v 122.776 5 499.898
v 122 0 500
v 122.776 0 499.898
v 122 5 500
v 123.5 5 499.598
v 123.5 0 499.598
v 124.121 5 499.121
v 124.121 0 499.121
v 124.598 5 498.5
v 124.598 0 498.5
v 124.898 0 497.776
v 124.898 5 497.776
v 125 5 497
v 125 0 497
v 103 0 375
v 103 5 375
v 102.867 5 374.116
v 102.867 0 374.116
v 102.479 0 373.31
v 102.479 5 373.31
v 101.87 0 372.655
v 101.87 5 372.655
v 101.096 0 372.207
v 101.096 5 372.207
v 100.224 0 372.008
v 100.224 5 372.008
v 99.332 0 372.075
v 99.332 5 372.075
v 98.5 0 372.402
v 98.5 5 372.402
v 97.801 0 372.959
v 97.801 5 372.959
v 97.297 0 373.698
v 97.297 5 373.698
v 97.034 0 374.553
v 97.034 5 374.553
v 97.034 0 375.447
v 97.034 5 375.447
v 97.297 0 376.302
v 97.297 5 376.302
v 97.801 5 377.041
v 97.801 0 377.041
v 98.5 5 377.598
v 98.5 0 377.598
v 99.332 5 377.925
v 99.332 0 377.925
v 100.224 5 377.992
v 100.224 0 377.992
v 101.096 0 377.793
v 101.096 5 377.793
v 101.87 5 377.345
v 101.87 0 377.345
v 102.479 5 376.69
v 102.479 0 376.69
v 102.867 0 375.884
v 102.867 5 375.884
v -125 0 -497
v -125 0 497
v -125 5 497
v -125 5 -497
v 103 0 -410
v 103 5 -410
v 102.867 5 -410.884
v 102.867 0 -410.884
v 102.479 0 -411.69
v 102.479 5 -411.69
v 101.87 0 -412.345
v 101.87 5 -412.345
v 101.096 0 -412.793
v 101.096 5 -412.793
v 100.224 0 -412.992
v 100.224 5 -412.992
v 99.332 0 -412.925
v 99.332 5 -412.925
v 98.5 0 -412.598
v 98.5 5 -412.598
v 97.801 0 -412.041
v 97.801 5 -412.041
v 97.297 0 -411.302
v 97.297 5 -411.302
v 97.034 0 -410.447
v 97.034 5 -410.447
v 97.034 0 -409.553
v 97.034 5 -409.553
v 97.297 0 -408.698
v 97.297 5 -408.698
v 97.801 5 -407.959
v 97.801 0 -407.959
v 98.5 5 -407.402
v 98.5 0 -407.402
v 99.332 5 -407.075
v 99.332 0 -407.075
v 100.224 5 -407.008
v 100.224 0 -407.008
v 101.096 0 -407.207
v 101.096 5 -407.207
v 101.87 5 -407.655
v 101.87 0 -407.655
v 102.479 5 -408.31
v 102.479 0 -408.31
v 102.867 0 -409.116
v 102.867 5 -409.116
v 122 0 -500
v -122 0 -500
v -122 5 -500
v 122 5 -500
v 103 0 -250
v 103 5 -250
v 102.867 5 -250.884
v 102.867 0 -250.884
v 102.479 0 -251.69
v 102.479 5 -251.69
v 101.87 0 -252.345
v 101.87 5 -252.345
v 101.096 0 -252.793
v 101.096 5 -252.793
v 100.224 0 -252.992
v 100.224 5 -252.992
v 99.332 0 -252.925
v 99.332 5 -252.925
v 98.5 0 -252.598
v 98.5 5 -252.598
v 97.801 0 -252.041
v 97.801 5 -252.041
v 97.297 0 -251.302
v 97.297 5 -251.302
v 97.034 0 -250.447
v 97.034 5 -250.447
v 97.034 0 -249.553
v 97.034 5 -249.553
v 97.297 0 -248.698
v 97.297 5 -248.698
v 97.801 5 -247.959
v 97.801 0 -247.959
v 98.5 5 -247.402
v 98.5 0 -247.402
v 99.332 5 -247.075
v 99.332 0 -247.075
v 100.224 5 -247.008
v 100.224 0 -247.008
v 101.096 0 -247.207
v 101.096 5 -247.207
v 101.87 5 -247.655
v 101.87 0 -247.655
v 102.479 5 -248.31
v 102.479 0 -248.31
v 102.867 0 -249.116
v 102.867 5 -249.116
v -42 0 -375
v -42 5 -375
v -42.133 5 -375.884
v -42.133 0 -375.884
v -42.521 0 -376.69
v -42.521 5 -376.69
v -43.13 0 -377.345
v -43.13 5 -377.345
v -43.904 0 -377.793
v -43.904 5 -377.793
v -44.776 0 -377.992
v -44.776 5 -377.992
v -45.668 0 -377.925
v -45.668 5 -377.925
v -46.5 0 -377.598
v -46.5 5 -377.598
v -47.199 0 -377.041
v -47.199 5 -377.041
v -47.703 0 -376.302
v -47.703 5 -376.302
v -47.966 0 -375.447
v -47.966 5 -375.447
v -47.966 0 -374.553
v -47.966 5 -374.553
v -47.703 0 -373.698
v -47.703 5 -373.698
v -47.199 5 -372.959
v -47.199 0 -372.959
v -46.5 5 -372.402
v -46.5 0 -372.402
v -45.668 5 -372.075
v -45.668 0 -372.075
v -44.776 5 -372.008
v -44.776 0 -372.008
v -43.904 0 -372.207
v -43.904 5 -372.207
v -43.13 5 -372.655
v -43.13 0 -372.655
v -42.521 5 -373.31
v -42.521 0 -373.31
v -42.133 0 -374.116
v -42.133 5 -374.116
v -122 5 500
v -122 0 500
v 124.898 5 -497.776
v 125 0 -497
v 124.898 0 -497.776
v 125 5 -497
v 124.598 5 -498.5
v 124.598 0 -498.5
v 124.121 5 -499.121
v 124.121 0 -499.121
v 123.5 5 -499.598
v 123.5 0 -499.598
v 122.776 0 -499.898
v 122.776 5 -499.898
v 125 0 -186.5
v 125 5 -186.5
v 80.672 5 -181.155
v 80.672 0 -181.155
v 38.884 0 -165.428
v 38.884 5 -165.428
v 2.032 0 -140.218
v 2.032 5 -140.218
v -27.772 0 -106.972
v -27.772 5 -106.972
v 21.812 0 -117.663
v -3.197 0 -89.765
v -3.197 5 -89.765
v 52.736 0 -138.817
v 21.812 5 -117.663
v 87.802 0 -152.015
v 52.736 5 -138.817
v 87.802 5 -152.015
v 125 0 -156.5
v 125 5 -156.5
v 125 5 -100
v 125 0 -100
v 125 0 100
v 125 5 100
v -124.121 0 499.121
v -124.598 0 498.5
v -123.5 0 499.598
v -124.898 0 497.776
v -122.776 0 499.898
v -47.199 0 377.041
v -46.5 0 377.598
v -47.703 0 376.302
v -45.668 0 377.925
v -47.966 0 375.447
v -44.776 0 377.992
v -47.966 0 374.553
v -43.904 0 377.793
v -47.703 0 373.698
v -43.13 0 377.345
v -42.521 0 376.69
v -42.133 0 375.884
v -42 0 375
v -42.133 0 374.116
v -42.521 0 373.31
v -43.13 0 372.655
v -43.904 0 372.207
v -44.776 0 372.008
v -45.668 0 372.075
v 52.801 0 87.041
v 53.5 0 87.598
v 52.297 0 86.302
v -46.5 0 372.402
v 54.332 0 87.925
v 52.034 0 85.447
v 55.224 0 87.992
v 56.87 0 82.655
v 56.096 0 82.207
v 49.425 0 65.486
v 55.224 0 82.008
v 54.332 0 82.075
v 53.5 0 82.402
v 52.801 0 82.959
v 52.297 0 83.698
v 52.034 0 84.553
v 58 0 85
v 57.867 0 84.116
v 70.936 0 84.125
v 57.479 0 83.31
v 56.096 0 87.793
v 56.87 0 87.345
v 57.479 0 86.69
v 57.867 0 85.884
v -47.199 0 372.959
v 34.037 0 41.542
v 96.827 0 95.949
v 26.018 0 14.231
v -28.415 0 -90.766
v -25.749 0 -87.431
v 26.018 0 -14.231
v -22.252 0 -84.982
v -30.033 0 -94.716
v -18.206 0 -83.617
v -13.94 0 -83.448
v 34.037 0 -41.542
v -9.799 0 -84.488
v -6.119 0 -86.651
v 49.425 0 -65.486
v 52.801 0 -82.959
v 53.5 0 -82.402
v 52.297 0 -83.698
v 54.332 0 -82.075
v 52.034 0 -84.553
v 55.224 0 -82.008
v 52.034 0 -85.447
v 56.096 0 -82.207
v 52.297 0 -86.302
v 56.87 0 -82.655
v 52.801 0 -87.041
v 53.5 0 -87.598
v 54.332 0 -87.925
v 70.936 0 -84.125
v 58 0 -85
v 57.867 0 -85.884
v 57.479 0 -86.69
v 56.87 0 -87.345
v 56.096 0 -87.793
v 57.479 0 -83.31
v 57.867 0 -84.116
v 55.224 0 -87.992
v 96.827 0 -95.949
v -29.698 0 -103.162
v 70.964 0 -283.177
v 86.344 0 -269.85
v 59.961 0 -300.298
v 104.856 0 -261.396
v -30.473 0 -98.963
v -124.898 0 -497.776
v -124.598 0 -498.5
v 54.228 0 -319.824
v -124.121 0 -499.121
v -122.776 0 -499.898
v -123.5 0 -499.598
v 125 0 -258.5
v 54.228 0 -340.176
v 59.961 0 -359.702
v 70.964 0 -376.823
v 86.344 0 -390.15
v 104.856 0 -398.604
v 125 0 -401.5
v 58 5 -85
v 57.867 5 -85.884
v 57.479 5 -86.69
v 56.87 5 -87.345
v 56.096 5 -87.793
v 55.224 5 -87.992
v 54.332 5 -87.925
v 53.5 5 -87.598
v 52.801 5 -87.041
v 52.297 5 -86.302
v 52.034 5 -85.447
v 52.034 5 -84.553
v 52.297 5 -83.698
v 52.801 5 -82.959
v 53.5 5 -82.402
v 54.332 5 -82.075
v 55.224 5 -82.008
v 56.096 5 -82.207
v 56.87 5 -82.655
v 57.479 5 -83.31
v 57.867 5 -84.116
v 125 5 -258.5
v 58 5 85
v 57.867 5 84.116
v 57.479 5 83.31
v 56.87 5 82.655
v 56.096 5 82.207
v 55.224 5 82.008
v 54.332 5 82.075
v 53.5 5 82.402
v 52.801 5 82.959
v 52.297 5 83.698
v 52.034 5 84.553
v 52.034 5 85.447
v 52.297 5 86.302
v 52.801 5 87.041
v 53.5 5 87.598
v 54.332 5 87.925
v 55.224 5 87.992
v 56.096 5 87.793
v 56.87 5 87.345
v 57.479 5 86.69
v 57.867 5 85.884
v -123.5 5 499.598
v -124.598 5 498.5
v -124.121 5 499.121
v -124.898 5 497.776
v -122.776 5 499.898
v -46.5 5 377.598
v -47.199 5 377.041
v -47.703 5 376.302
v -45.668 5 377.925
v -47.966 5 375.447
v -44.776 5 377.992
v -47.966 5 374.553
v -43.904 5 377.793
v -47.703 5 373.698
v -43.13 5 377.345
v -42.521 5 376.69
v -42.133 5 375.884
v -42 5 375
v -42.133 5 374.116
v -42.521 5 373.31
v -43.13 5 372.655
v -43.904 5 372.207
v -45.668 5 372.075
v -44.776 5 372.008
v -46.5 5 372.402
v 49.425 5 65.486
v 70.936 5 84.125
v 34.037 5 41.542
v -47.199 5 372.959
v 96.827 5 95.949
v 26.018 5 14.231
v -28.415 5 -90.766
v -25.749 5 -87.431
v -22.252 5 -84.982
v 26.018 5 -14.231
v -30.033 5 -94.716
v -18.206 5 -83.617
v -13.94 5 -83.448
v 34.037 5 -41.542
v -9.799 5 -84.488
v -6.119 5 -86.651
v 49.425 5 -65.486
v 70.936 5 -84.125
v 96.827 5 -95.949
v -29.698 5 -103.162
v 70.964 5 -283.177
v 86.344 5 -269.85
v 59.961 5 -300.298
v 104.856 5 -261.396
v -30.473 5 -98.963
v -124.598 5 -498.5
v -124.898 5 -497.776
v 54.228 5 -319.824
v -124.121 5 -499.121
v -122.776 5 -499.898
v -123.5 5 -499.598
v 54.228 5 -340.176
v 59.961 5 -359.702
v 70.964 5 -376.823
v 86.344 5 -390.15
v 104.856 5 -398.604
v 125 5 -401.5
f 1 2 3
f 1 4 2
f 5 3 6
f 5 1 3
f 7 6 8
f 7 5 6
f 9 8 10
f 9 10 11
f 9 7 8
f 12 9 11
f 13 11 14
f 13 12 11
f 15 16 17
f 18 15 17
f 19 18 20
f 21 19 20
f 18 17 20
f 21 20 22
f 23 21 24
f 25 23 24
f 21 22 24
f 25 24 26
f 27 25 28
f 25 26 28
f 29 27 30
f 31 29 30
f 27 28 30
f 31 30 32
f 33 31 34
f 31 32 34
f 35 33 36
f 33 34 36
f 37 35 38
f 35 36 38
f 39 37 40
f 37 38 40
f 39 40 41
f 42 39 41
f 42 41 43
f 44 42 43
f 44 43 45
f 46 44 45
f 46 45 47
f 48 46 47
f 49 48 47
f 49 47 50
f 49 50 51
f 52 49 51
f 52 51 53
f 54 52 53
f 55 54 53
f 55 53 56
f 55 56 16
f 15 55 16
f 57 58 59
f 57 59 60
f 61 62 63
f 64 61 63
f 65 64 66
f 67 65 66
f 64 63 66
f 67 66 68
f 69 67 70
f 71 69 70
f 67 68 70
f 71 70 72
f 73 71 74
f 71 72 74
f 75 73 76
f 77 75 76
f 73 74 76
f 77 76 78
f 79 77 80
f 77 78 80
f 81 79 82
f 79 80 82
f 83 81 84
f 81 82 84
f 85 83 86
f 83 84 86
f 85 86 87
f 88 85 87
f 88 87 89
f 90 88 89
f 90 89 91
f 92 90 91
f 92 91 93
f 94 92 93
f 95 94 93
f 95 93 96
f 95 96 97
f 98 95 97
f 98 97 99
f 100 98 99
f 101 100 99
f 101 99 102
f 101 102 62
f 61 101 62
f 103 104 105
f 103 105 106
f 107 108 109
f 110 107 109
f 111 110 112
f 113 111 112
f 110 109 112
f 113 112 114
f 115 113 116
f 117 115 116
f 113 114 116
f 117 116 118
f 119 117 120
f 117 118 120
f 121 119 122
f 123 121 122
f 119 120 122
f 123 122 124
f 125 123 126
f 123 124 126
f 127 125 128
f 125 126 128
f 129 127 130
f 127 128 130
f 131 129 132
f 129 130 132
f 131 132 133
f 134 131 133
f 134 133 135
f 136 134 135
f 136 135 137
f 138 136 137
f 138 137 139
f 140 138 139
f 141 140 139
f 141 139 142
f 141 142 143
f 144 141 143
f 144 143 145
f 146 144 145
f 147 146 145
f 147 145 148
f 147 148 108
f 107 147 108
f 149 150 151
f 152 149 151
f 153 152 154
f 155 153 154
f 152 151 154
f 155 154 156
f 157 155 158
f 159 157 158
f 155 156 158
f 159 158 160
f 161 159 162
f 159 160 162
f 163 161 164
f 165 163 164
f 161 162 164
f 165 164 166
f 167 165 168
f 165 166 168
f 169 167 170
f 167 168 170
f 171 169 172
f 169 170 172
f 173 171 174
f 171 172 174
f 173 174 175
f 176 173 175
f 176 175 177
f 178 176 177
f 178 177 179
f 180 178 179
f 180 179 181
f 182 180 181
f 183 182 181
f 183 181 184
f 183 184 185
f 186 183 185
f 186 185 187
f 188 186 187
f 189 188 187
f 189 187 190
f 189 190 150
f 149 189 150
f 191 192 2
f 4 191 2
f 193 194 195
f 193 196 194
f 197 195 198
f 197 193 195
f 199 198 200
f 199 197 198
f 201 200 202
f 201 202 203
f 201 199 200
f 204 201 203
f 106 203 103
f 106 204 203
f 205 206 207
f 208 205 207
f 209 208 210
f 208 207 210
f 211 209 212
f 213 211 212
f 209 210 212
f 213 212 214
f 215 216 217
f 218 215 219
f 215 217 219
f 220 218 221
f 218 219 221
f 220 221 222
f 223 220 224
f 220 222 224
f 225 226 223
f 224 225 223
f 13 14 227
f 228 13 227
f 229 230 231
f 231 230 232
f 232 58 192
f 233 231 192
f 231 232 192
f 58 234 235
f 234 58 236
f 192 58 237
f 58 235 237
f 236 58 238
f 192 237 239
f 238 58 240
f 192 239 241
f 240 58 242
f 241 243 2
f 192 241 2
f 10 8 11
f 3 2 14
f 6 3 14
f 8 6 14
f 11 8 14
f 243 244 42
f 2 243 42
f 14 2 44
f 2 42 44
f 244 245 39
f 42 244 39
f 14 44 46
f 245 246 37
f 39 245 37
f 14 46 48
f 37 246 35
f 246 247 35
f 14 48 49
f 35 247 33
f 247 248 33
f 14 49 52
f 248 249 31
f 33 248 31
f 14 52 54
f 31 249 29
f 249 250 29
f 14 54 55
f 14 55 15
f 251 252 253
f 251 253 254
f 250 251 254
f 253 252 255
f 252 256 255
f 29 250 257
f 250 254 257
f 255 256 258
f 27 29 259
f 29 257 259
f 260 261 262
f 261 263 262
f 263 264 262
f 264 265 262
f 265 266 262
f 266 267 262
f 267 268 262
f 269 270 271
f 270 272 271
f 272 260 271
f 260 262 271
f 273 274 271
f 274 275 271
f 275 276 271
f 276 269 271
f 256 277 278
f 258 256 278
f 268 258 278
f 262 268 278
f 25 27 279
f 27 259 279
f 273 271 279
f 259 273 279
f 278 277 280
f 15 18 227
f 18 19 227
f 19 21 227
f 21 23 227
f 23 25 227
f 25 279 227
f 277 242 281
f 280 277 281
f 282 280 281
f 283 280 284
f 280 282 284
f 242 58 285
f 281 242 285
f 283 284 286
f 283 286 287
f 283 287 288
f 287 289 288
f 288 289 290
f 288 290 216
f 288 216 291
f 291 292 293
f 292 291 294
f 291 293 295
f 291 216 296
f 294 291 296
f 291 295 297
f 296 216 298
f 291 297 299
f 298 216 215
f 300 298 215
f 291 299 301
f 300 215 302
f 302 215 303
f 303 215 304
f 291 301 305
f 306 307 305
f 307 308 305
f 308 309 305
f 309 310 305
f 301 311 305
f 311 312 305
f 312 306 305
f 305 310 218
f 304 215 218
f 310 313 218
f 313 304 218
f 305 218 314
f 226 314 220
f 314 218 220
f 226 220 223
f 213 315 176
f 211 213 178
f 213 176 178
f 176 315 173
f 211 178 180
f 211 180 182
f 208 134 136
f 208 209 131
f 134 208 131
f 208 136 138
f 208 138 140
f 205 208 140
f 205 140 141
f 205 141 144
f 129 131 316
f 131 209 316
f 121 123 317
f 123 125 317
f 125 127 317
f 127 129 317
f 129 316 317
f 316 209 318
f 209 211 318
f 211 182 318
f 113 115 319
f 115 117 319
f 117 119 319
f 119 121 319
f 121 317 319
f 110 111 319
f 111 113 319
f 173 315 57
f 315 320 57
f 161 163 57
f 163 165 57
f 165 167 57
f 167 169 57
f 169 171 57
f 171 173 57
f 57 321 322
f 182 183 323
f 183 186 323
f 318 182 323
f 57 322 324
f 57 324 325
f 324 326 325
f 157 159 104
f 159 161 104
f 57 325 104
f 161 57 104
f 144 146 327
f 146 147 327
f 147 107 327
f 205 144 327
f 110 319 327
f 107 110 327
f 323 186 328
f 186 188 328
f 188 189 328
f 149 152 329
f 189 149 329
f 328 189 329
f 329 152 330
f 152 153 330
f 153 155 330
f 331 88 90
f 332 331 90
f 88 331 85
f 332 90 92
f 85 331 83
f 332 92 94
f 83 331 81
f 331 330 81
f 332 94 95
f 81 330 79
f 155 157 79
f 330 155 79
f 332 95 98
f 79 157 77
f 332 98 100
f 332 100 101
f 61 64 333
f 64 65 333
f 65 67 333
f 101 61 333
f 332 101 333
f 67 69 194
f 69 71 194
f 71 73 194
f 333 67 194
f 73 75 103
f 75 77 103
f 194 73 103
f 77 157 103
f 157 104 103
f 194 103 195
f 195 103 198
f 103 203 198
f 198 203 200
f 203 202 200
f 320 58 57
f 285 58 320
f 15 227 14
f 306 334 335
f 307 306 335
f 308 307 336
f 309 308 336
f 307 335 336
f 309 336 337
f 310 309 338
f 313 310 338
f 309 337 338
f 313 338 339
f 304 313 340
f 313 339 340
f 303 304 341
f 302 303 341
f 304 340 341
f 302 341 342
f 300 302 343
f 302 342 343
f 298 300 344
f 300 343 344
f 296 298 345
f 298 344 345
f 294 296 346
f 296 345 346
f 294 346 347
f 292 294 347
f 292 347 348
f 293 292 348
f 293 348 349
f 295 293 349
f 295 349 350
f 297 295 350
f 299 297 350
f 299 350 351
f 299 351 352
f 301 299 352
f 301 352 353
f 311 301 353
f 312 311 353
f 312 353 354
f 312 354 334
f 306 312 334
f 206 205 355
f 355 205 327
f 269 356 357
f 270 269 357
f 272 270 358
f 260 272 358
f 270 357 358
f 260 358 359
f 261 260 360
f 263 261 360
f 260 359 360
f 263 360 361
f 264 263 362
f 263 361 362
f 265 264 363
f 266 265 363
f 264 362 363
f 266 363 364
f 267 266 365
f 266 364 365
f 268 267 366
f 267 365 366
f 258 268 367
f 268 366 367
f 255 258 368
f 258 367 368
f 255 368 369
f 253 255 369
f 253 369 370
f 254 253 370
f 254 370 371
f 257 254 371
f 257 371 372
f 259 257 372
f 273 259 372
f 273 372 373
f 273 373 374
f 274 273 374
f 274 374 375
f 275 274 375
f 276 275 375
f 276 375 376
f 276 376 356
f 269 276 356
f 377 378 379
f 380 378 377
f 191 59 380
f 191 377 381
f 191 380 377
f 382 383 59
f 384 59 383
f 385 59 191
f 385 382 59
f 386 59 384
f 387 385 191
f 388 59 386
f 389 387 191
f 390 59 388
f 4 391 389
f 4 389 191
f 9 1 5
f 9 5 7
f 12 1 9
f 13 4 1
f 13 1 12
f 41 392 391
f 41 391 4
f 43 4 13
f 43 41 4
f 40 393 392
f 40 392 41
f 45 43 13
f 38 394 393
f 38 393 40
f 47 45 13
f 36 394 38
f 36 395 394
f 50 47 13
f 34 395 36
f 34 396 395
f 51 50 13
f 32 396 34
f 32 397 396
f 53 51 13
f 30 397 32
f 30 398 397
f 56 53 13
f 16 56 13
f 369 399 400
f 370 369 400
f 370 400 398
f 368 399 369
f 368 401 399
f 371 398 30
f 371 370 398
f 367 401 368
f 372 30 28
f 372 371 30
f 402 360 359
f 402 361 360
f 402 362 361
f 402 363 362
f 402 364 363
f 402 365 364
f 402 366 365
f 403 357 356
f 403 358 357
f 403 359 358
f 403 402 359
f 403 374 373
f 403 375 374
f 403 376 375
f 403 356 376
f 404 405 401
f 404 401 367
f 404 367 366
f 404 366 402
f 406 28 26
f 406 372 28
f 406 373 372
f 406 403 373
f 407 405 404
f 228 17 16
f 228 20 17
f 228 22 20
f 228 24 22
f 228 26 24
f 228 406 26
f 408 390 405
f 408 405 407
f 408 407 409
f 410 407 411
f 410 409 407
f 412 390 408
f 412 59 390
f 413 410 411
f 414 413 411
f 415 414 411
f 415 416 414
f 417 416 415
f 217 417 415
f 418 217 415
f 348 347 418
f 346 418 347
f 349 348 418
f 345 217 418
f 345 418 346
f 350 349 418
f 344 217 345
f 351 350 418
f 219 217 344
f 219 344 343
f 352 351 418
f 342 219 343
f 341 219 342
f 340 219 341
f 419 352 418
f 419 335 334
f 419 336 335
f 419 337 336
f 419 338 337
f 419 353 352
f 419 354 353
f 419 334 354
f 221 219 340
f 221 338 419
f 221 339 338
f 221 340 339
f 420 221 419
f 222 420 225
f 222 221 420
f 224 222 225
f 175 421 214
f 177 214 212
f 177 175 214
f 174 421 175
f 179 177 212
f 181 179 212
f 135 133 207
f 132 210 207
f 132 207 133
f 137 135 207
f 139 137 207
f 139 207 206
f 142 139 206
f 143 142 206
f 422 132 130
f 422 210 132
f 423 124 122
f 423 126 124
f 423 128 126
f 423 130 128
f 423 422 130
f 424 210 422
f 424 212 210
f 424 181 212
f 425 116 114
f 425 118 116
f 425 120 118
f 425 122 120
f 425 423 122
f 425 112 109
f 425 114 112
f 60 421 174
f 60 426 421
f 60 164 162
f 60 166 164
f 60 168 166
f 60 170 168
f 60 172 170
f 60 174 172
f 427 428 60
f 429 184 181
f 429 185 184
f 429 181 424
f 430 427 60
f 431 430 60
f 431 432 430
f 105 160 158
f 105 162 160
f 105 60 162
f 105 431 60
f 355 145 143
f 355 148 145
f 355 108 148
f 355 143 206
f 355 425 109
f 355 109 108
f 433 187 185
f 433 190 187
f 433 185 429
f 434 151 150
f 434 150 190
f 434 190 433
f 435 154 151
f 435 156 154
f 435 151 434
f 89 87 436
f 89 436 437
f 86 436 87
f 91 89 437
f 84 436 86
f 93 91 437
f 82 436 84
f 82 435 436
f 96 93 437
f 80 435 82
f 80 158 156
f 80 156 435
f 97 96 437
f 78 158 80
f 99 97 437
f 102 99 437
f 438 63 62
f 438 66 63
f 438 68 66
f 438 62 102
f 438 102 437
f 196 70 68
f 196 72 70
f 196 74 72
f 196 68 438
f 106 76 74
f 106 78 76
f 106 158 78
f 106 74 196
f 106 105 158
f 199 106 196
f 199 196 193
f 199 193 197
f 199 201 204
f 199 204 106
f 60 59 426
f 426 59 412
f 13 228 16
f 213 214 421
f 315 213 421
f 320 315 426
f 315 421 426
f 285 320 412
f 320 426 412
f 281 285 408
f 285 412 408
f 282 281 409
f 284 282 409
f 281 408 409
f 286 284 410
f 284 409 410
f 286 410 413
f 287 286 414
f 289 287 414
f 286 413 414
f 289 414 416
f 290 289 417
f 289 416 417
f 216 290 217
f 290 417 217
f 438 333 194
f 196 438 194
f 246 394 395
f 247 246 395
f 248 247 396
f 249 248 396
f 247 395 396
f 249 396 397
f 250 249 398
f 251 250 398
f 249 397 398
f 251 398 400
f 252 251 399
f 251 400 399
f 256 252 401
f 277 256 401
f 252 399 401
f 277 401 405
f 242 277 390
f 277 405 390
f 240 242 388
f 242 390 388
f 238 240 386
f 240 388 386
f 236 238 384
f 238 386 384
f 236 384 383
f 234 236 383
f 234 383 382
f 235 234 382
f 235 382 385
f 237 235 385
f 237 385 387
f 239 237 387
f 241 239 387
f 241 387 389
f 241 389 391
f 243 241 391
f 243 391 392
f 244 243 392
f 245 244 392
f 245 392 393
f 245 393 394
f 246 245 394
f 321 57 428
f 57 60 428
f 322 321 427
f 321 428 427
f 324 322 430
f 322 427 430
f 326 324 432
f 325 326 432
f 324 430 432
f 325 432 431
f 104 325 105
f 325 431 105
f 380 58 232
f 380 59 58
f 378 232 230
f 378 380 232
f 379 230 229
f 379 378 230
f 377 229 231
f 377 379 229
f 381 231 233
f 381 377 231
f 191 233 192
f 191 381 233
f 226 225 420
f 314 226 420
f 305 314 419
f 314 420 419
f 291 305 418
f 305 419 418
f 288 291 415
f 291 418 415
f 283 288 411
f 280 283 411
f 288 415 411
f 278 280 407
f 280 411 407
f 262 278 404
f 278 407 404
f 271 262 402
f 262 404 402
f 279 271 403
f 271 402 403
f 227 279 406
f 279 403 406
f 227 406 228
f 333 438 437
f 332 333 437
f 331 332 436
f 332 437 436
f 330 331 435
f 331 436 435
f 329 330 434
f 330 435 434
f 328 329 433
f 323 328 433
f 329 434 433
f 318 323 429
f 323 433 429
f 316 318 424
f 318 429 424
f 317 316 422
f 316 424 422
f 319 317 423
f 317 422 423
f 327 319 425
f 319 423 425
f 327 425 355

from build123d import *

# Parameters (mm, degrees)
SKETCH1_W           = 250
SKETCH1_H           = 1000
BOSS_EXTRUDE1_DEPTH = 5
FILLET1_R           = 3
CUT_EXTRUDE2_REACH  = 7
SKETCH3_R           = 71.5
SKETCH3_R_2         = 100
SKETCH3_R_3         = 3


with BuildPart() as part:
    # Sketch1 → Boss-Extrude1 (new body)
    with BuildSketch(Plane(origin=(0, 0, 0), x_dir=(1, 0, 0), z_dir=(0, 1, 0))):
        Rectangle(SKETCH1_W, SKETCH1_H)
    extrude(amount=BOSS_EXTRUDE1_DEPTH)

    # Fillet1
    fillet1_edges = [part.edges().sort_by_distance(p)[0] for p in [
        (125, 2.5, 500),
        (-125, 2.5, 500),
        (-125, 2.5, -500),
        (125, 2.5, -500),
    ]]
    fillet(fillet1_edges, radius=FILLET1_R)

    # Sketch3 → Cut-Extrude2 (cut, up to next)
    with BuildSketch(Plane(origin=(0, 5, 0), x_dir=(1, 0, 0), z_dir=(0, 1, 0)), mode=Mode.PRIVATE) as cut_extrude2_sk1:
        with Locations((125, 330)):
            Circle(SKETCH3_R)
    cut_extrude2_tool1 = extrude(cut_extrude2_sk1.sketch, amount=-CUT_EXTRUDE2_REACH, mode=Mode.PRIVATE) & part.part
    add(cut_extrude2_tool1.solids().sort_by_distance((125, 5, -330))[0], mode=Mode.SUBTRACT)
    # Sketch3 → Cut-Extrude2 (cut, up to next)
    with BuildSketch(Plane(origin=(0, 5, 0), x_dir=(1, 0, 0), z_dir=(0, 1, 0)), mode=Mode.PRIVATE) as cut_extrude2_sk2:
        with Locations((125, 0)):
            Circle(SKETCH3_R_2)
    cut_extrude2_tool2 = extrude(cut_extrude2_sk2.sketch, amount=-CUT_EXTRUDE2_REACH, mode=Mode.PRIVATE) & part.part
    add(cut_extrude2_tool2.solids().sort_by_distance((125, 5, 0))[0], mode=Mode.SUBTRACT)
    # Sketch3 → Cut-Extrude2 (cut, up to next)
    with BuildSketch(Plane(origin=(0, 5, 0), x_dir=(1, 0, 0), z_dir=(0, 1, 0)), mode=Mode.PRIVATE) as cut_extrude2_sk3:
        with Locations((-45, -375)):
            Circle(SKETCH3_R_3)
    cut_extrude2_tool3 = extrude(cut_extrude2_sk3.sketch, amount=-CUT_EXTRUDE2_REACH, mode=Mode.PRIVATE) & part.part
    add(cut_extrude2_tool3.solids().sort_by_distance((-45, 5, 375))[0], mode=Mode.SUBTRACT)
    # Sketch3 → Cut-Extrude2 (cut, up to next)
    with BuildSketch(Plane(origin=(0, 5, 0), x_dir=(1, 0, 0), z_dir=(0, 1, 0)), mode=Mode.PRIVATE) as cut_extrude2_sk4:
        with Locations((-45, 375)):
            Circle(SKETCH3_R_3)
    cut_extrude2_tool4 = extrude(cut_extrude2_sk4.sketch, amount=-CUT_EXTRUDE2_REACH, mode=Mode.PRIVATE) & part.part
    add(cut_extrude2_tool4.solids().sort_by_distance((-45, 5, -375))[0], mode=Mode.SUBTRACT)
    # Sketch3 → Cut-Extrude2 (cut, up to next)
    with BuildSketch(Plane(origin=(0, 5, 0), x_dir=(1, 0, 0), z_dir=(0, 1, 0)), mode=Mode.PRIVATE) as cut_extrude2_sk5:
        with Locations((55, -85)):
            Circle(SKETCH3_R_3)
    cut_extrude2_tool5 = extrude(cut_extrude2_sk5.sketch, amount=-CUT_EXTRUDE2_REACH, mode=Mode.PRIVATE) & part.part
    add(cut_extrude2_tool5.solids().sort_by_distance((55, 5, 85))[0], mode=Mode.SUBTRACT)
    # Sketch3 → Cut-Extrude2 (cut, up to next)
    with BuildSketch(Plane(origin=(0, 5, 0), x_dir=(1, 0, 0), z_dir=(0, 1, 0)), mode=Mode.PRIVATE) as cut_extrude2_sk6:
        with Locations((55, 85)):
            Circle(SKETCH3_R_3)
    cut_extrude2_tool6 = extrude(cut_extrude2_sk6.sketch, amount=-CUT_EXTRUDE2_REACH, mode=Mode.PRIVATE) & part.part
    add(cut_extrude2_tool6.solids().sort_by_distance((55, 5, -85))[0], mode=Mode.SUBTRACT)
    # Sketch3 → Cut-Extrude2 (cut, up to next)
    with BuildSketch(Plane(origin=(0, 5, 0), x_dir=(1, 0, 0), z_dir=(0, 1, 0)), mode=Mode.PRIVATE) as cut_extrude2_sk7:
        with Locations((100, 410)):
            Circle(SKETCH3_R_3)
    cut_extrude2_tool7 = extrude(cut_extrude2_sk7.sketch, amount=-CUT_EXTRUDE2_REACH, mode=Mode.PRIVATE) & part.part
    add(cut_extrude2_tool7.solids().sort_by_distance((100, 5, -410))[0], mode=Mode.SUBTRACT)
    # Sketch3 → Cut-Extrude2 (cut, up to next)
    with BuildSketch(Plane(origin=(0, 5, 0), x_dir=(1, 0, 0), z_dir=(0, 1, 0)), mode=Mode.PRIVATE) as cut_extrude2_sk8:
        with Locations((100, 250)):
            Circle(SKETCH3_R_3)
    cut_extrude2_tool8 = extrude(cut_extrude2_sk8.sketch, amount=-CUT_EXTRUDE2_REACH, mode=Mode.PRIVATE) & part.part
    add(cut_extrude2_tool8.solids().sort_by_distance((100, 5, -250))[0], mode=Mode.SUBTRACT)
    # Sketch3 → Cut-Extrude2 (cut, up to next)
    with BuildSketch(Plane(origin=(0, 5, 0), x_dir=(1, 0, 0), z_dir=(0, 1, 0)), mode=Mode.PRIVATE) as cut_extrude2_sk9:
        with Locations((100, -375)):
            Circle(SKETCH3_R_3)
    cut_extrude2_tool9 = extrude(cut_extrude2_sk9.sketch, amount=-CUT_EXTRUDE2_REACH, mode=Mode.PRIVATE) & part.part
    add(cut_extrude2_tool9.solids().sort_by_distance((100, 5, 375))[0], mode=Mode.SUBTRACT)
    # Sketch3 → Cut-Extrude2 (cut, up to next)
    with BuildSketch(Plane(origin=(0, 5, 0), x_dir=(1, 0, 0), z_dir=(0, 1, 0)), mode=Mode.PRIVATE) as cut_extrude2_sk10:
        with BuildLine():
            ThreePointArc((125, 186.5), (38.883883632, 165.427520388), (-27.77185626, 106.972005379))
            ThreePointArc((-27.77185626, 106.972005379), (-24.088222141, 86.08107817), (-3.197294931, 89.764712289))
            ThreePointArc((-3.197294931, 89.764712289), (52.736342029, 138.817195392), (125, 156.5))
            ThreePointArc((125, 156.5), (140, 171.5), (125, 186.5))
        make_face()
    cut_extrude2_tool10 = extrude(cut_extrude2_sk10.sketch, amount=-CUT_EXTRUDE2_REACH, mode=Mode.PRIVATE) & part.part
    add(cut_extrude2_tool10.solids().sort_by_distance((49.559691, 5, -144.919486))[0], mode=Mode.SUBTRACT)


solid = part.part
